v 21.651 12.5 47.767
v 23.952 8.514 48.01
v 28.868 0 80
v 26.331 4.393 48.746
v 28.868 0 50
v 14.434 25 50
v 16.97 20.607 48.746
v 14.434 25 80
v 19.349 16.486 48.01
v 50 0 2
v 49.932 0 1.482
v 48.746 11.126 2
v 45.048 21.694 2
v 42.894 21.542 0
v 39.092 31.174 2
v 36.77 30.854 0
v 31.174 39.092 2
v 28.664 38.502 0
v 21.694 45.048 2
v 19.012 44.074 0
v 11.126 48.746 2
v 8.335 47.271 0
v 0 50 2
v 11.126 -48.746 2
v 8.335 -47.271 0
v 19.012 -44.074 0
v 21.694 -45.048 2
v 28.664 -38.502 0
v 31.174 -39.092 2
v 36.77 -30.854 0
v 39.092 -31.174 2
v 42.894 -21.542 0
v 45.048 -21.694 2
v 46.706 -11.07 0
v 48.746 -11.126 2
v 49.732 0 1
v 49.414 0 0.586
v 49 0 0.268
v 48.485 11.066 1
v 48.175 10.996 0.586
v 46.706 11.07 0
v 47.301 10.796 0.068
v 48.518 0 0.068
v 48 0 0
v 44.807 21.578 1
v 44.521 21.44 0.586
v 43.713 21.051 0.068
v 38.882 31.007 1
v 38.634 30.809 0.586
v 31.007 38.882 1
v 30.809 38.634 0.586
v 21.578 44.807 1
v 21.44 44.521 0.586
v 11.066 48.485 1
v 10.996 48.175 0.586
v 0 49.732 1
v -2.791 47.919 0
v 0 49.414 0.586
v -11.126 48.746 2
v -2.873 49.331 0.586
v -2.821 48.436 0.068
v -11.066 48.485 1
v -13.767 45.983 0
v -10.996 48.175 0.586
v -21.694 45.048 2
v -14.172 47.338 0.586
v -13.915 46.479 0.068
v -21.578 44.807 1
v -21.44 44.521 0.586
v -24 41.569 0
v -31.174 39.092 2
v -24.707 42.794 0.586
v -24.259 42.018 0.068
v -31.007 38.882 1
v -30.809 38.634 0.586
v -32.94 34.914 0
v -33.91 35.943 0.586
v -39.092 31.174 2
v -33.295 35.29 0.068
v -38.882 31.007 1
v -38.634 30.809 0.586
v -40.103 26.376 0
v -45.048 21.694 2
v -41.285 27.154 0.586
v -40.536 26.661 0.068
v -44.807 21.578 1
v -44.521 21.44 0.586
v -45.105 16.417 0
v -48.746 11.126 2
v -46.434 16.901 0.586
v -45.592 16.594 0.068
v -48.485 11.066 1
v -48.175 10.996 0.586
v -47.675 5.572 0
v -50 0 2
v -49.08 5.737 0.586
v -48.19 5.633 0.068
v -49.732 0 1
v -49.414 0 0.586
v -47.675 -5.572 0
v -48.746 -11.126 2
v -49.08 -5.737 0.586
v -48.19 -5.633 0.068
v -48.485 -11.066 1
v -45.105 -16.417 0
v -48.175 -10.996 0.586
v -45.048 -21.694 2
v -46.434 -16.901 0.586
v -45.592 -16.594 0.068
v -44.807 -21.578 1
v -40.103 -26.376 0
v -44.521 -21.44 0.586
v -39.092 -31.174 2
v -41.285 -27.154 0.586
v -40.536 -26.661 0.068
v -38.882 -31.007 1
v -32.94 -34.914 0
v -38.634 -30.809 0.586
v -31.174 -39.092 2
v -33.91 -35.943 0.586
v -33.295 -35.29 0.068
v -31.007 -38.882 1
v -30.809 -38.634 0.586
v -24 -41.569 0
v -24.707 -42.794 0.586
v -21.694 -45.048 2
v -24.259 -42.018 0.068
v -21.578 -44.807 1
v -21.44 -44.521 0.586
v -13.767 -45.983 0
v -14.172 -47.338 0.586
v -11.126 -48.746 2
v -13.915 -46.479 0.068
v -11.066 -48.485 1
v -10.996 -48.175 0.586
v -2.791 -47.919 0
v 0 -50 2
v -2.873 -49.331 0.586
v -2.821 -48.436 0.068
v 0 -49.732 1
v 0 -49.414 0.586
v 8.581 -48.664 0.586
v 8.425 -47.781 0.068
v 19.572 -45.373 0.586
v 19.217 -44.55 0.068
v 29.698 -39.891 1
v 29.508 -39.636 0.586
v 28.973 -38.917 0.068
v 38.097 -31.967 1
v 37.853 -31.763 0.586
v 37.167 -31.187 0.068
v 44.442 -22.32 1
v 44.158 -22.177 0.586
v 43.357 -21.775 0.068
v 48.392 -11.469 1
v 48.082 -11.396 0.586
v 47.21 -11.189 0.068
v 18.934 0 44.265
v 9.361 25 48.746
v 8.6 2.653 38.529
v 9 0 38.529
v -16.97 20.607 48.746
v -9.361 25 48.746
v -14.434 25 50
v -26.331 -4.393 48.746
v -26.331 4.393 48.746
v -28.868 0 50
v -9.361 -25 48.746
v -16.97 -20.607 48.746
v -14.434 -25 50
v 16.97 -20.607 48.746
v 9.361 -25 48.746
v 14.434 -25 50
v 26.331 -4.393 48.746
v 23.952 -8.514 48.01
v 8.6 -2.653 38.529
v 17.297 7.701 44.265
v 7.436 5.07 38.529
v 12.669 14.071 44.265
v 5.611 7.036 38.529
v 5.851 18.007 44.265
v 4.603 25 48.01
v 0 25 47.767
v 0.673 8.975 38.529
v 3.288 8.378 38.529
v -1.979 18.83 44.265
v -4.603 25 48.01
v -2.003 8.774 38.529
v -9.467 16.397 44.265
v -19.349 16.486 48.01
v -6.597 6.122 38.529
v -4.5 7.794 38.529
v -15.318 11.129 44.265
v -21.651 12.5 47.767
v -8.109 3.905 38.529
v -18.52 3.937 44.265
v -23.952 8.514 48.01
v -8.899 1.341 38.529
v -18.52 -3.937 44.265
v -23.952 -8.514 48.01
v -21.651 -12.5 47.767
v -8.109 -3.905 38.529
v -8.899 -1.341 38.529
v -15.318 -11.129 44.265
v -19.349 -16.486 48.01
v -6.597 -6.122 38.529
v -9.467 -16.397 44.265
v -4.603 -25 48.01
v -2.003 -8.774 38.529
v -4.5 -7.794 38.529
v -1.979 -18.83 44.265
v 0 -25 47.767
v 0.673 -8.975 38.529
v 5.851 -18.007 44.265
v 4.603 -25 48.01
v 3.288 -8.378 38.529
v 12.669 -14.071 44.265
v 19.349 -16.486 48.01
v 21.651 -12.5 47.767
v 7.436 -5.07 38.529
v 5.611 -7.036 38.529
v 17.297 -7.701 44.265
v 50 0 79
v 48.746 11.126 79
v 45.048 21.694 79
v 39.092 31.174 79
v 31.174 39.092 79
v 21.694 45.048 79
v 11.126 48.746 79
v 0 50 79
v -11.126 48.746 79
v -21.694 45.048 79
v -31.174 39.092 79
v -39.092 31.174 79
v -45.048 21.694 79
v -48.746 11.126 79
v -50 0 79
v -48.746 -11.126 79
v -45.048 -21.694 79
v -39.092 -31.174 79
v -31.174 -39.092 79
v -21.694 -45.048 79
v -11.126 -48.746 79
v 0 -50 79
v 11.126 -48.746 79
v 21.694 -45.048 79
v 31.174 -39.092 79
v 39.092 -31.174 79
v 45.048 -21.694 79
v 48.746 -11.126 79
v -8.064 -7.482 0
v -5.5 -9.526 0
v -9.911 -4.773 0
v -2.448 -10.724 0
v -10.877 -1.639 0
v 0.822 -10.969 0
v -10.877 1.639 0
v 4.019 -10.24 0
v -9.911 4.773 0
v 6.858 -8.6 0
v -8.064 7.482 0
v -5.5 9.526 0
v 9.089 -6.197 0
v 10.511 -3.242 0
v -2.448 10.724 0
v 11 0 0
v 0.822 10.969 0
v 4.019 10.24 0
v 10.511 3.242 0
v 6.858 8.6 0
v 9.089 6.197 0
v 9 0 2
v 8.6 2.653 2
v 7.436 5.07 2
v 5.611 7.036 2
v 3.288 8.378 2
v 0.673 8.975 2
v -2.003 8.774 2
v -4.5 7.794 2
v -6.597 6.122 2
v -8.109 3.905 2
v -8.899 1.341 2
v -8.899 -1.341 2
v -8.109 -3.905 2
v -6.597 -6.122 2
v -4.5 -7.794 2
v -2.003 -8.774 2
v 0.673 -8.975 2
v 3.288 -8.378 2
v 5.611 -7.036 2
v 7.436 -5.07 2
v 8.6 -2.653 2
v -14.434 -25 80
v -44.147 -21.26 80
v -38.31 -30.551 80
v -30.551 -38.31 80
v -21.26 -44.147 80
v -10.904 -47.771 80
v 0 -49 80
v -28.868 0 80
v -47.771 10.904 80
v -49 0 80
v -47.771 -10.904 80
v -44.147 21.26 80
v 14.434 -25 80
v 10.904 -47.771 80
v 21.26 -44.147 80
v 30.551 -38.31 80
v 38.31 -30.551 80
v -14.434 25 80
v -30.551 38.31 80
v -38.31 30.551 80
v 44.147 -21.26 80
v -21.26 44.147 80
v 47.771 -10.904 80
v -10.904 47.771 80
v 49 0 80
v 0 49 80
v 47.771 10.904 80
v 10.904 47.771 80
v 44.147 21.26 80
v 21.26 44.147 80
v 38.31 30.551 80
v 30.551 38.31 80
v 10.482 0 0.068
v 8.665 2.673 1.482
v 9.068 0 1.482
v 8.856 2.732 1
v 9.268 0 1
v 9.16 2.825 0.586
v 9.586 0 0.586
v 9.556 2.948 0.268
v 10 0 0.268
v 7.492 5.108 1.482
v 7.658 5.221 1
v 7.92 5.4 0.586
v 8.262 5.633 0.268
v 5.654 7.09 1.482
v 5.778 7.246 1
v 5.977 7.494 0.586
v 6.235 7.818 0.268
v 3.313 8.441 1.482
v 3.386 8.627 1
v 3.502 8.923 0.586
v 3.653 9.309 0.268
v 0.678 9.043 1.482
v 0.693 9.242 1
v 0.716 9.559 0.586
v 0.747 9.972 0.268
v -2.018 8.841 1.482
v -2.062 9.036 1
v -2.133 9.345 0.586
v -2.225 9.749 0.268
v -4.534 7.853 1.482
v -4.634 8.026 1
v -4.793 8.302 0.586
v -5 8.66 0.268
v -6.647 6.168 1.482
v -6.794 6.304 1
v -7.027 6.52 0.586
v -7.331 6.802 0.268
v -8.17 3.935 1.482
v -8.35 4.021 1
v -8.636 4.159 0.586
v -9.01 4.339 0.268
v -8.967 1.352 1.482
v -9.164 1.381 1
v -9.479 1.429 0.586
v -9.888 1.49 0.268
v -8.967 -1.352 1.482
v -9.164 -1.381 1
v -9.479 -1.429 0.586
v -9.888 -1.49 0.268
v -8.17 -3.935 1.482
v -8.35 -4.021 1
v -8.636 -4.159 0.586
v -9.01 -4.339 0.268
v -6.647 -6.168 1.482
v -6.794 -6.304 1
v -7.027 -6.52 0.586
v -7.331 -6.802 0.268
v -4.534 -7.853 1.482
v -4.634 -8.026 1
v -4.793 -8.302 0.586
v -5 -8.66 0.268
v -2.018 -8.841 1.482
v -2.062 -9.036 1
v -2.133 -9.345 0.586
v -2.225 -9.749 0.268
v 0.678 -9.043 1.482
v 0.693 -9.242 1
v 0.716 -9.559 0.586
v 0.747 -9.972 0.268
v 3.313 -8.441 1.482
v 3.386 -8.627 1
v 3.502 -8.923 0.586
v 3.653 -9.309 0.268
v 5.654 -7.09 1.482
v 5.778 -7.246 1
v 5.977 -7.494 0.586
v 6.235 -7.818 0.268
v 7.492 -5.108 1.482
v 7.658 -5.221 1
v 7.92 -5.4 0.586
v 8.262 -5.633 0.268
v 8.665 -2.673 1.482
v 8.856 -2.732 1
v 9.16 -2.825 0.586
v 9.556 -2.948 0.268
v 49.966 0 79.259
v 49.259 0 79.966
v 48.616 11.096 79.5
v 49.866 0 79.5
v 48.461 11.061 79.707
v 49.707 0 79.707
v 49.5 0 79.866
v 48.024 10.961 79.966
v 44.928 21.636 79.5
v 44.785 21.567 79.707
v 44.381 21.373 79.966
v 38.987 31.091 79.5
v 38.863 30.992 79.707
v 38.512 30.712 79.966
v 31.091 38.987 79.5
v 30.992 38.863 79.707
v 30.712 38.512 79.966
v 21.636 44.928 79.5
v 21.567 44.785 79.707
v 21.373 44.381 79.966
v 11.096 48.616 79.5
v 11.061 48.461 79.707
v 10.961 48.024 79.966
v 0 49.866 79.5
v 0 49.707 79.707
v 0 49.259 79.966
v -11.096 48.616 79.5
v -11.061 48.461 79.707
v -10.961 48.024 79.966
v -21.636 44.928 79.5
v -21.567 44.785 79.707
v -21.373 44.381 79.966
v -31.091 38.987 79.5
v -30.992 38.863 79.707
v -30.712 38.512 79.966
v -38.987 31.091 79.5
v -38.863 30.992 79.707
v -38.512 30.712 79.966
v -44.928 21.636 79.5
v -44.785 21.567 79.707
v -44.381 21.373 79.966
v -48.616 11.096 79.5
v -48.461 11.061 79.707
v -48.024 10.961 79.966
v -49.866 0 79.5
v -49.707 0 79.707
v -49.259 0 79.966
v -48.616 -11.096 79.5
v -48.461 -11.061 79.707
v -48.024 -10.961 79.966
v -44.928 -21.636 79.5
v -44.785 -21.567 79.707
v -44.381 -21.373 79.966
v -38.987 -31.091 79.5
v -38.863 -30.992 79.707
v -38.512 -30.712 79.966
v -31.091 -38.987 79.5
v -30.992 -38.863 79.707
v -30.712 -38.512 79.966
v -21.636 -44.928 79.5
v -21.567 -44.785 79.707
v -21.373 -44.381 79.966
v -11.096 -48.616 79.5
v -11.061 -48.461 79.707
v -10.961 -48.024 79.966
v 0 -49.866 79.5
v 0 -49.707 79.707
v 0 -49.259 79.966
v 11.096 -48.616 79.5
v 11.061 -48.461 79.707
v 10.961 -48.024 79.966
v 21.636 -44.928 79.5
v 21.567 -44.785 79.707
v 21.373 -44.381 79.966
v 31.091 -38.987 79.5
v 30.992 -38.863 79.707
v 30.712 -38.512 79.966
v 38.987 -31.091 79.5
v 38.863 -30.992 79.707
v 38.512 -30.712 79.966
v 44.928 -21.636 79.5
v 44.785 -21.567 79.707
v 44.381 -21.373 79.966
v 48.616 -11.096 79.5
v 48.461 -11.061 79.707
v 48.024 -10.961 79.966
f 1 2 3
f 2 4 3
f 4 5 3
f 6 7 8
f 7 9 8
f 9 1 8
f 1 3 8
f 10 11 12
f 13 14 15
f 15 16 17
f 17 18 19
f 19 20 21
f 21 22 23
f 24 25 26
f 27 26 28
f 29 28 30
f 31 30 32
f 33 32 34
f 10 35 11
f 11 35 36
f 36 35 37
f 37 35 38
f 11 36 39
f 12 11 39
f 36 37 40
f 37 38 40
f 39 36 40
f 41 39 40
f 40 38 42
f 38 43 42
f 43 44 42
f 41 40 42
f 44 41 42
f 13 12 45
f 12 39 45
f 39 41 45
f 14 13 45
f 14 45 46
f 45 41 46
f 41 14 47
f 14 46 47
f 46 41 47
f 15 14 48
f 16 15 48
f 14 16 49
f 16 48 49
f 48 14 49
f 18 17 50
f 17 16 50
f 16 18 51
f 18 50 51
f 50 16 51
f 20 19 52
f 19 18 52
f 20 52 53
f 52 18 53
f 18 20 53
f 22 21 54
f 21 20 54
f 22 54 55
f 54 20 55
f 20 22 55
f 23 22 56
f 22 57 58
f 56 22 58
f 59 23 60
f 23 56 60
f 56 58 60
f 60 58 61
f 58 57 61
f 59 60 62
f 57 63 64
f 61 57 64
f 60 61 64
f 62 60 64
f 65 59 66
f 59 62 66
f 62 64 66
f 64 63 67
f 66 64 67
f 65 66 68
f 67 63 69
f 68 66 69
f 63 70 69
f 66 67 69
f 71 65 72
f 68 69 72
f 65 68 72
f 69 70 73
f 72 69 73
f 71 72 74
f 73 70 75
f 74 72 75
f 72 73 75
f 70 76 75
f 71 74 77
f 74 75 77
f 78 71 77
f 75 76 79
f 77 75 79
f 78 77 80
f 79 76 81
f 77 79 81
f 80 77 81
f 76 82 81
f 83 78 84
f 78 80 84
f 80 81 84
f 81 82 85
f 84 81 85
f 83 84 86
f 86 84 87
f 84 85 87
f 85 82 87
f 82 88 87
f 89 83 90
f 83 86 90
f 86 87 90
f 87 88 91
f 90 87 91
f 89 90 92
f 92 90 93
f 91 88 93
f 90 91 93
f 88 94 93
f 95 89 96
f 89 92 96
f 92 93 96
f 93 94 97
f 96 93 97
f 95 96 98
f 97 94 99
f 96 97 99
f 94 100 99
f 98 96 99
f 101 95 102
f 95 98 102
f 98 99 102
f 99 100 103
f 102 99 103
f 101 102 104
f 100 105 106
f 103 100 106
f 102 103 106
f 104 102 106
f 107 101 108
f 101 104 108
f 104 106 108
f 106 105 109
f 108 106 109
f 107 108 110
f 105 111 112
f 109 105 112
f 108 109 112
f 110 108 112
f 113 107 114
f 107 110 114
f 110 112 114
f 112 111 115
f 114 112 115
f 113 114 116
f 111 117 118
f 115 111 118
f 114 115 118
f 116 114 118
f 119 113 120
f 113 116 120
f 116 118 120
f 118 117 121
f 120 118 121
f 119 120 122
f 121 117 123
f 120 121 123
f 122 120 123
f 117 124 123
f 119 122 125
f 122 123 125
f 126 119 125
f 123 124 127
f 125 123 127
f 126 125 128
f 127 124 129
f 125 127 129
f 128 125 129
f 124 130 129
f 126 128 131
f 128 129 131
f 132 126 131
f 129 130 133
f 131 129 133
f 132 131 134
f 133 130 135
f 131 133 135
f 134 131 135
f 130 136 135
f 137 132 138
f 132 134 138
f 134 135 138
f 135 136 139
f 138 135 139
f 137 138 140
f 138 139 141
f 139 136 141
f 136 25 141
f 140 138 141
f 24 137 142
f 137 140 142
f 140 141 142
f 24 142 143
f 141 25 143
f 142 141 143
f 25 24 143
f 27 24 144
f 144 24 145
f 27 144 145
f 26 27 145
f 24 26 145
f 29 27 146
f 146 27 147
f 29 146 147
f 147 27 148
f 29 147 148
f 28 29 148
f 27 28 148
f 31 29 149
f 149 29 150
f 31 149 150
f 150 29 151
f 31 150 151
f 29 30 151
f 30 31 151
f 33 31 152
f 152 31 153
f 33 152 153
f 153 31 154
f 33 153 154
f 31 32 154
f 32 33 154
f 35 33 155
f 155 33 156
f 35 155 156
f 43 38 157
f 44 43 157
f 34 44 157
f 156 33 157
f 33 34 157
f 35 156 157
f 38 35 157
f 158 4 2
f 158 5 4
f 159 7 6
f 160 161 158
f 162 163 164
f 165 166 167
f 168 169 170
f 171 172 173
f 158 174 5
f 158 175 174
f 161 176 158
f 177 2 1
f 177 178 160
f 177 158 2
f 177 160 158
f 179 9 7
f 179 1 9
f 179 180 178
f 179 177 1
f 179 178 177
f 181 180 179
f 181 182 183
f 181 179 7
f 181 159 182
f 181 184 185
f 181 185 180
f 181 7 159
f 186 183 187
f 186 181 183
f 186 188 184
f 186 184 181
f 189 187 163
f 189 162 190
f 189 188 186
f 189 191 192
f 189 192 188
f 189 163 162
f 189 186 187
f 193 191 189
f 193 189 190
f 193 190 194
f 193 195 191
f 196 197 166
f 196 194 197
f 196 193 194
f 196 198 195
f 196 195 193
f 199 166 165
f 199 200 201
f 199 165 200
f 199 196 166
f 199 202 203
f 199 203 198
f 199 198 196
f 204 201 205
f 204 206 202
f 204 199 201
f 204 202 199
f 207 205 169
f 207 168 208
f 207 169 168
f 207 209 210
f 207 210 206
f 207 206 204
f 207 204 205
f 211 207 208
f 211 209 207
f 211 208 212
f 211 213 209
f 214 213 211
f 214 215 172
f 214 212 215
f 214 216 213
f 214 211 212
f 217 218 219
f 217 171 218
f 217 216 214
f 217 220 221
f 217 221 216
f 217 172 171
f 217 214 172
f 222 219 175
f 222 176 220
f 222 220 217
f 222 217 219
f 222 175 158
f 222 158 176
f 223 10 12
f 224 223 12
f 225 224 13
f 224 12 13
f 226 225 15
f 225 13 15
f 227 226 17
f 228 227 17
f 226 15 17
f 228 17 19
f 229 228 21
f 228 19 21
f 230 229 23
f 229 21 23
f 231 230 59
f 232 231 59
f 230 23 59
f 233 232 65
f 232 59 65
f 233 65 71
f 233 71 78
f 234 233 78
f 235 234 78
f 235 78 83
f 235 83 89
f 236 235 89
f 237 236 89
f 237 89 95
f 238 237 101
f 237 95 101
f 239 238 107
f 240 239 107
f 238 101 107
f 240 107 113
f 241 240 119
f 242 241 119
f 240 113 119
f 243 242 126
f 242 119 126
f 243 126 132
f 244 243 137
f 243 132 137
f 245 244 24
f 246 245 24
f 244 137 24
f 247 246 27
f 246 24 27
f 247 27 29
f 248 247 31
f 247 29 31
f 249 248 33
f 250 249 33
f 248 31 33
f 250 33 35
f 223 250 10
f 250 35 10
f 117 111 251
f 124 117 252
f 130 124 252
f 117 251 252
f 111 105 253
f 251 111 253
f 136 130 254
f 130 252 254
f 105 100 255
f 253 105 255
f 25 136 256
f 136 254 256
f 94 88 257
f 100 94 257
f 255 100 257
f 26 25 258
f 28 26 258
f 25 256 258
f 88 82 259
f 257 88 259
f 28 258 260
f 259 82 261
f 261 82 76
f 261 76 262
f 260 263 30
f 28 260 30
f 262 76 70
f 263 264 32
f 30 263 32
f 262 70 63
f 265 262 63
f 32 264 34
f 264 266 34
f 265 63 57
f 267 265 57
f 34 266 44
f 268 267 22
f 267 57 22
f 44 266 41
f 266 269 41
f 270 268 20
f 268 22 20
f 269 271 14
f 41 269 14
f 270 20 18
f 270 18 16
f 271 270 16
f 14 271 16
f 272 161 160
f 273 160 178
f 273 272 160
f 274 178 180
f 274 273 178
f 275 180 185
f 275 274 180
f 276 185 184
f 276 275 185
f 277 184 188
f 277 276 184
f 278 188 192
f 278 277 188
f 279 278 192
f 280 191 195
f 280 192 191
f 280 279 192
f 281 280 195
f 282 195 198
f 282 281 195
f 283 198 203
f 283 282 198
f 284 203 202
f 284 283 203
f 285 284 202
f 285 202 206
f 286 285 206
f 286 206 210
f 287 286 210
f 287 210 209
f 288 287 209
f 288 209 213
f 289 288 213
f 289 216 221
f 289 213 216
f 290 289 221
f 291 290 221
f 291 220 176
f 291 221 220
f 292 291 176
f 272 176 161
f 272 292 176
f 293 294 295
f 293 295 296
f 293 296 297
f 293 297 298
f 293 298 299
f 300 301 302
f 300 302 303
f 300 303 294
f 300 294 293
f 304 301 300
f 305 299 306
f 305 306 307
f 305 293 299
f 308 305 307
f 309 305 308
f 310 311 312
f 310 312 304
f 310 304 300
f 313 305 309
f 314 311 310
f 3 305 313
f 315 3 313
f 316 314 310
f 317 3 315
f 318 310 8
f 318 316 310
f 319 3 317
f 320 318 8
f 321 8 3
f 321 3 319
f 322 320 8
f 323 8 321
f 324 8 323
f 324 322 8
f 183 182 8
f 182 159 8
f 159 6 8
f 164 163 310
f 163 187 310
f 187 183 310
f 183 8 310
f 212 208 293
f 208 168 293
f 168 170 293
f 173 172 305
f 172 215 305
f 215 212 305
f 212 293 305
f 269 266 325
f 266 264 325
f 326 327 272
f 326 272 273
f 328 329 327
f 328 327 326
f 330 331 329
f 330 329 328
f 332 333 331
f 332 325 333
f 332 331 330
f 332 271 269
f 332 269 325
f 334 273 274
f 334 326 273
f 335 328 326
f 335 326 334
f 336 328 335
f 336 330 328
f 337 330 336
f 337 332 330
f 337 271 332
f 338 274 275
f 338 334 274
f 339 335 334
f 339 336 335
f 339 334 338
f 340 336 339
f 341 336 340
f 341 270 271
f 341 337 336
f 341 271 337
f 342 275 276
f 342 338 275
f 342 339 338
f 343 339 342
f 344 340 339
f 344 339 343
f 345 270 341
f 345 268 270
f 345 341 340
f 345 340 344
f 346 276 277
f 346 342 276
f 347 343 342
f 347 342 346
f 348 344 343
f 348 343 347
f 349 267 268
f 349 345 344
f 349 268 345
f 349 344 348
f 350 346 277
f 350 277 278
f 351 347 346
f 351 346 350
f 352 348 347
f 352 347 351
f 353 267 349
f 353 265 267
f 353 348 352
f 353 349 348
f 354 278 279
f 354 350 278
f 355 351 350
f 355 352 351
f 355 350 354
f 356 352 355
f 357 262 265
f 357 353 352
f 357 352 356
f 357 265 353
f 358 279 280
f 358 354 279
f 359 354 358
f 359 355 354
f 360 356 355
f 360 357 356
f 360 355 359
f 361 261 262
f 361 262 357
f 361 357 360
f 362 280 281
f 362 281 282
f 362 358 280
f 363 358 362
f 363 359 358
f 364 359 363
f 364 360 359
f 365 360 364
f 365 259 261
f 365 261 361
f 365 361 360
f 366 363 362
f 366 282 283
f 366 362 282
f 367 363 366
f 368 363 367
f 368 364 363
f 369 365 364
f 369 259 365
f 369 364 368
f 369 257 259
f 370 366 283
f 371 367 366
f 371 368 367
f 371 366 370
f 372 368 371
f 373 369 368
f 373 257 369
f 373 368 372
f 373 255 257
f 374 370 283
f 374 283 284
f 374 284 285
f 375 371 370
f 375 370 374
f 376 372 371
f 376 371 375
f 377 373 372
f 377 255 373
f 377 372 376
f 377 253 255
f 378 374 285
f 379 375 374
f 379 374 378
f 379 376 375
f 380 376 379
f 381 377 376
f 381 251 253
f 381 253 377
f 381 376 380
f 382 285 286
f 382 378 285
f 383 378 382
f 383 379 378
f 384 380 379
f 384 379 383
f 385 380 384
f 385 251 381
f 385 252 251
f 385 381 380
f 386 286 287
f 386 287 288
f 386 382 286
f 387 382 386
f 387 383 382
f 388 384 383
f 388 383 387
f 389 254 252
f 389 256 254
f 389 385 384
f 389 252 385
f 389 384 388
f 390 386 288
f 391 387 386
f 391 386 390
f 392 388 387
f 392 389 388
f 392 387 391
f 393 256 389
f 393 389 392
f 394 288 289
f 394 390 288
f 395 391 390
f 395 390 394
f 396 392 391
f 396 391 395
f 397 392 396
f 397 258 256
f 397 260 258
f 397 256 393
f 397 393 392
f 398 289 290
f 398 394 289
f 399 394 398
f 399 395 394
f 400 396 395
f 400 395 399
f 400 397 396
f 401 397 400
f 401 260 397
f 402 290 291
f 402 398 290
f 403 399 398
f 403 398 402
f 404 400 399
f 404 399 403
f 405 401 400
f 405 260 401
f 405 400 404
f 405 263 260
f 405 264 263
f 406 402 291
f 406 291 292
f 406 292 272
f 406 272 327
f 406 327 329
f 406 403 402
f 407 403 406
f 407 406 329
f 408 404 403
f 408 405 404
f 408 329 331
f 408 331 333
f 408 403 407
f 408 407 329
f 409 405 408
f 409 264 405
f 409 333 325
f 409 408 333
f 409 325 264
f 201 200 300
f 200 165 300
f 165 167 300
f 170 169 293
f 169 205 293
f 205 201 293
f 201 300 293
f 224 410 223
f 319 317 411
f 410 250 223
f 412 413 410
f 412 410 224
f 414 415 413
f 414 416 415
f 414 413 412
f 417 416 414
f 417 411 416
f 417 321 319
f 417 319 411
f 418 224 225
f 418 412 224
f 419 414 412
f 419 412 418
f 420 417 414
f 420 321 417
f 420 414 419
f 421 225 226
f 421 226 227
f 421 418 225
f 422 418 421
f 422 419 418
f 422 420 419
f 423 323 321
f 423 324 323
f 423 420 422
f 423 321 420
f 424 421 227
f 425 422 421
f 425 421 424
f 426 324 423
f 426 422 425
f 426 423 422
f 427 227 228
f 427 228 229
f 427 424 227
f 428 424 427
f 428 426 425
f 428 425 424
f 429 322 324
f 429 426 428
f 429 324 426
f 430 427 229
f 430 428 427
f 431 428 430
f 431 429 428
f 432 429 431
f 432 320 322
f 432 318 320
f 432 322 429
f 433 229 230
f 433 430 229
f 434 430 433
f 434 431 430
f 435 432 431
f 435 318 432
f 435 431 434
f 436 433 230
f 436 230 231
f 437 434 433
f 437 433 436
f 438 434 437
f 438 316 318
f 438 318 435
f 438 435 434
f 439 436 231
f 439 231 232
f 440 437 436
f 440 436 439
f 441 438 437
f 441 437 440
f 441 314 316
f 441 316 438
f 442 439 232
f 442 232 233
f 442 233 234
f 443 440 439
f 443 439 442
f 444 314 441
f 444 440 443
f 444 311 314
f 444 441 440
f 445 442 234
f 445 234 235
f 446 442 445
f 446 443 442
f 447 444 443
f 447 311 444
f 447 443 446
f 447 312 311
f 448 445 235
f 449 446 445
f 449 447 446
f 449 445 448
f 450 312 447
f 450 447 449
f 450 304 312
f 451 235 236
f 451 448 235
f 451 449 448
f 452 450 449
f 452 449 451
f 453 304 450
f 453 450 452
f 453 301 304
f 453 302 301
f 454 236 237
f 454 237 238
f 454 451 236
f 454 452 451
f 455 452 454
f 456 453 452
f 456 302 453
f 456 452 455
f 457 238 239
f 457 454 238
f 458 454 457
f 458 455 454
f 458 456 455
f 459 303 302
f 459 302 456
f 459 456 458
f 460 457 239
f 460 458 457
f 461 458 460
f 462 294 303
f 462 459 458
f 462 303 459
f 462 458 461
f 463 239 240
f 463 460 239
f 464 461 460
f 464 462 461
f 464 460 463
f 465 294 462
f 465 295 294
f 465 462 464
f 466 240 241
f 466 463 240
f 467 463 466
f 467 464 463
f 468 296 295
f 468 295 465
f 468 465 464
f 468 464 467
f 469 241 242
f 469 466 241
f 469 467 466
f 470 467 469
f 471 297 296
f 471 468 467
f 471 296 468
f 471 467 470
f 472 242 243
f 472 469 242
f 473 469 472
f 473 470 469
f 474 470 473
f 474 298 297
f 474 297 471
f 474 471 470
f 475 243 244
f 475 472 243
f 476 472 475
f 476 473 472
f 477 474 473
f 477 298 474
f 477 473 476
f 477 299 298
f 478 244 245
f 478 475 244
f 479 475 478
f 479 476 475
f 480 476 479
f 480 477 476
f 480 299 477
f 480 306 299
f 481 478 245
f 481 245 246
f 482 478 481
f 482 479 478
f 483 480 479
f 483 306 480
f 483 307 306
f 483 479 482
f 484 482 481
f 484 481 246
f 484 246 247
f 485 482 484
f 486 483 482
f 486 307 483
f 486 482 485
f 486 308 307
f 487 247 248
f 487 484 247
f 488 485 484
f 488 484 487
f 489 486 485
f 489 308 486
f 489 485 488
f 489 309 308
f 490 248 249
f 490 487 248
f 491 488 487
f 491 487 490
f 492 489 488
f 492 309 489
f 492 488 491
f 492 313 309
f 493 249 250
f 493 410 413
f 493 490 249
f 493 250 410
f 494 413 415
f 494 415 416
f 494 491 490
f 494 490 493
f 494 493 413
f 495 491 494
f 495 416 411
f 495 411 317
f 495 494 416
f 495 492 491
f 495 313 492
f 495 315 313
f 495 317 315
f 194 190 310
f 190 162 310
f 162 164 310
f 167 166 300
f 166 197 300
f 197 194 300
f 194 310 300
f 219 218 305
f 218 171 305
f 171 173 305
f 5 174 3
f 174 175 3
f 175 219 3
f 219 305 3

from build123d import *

# Parameters (mm, degrees)
SKIZZE1_R                       = 50
SKIZZE1_R_2                     = 9
AUFSATZ_LINEAR_AUSTRAGEN1_DEPTH = 80
VERRUNDUNG1_R                   = 2
VERRUNDUNG2_R                   = 1
AUFSATZ_LINEAR_AUSTRAGEN2_DEPTH = 30
SKIZZE12_OUTSIDE_W              = 134.496
SKIZZE12_OUTSIDE_H              = 134.496
SCHNITT_LINEAR_AUSTRAGEN3_DEPTH = 81


with BuildPart() as part:
    # Skizze1 → Aufsatz-Linear austragen1 (new body)
    with BuildSketch(Plane.XY):
        Circle(SKIZZE1_R)
        Circle(SKIZZE1_R_2, mode=Mode.SUBTRACT)
    extrude(amount=AUFSATZ_LINEAR_AUSTRAGEN1_DEPTH)

    # Verrundung1
    verrundung1_edges = [part.edges().sort_by_distance(p)[0] for p in [
        (-50, 0, 0),
        (-9, 0, 0),
    ]]
    fillet(verrundung1_edges, radius=VERRUNDUNG1_R)

    # Verrundung2
    verrundung2_edges = [part.edges().sort_by_distance(p)[0] for p in [
        (-50, 0, 80),
    ]]
    fillet(verrundung2_edges, radius=VERRUNDUNG2_R)


with BuildPart() as body_2:
    # Skizze2 → Aufsatz-Linear austragen2 (new body)
    with BuildSketch(Plane.XY.offset(80)):
        Polygon((28.867513459, 0), (14.43375673, 25), (-14.43375673, 25), (-28.867513459, 0), (-14.43375673, -25), (14.43375673, -25), align=None)
    extrude(amount=-AUFSATZ_LINEAR_AUSTRAGEN2_DEPTH)

    # Skizze10 → Rotation1 (revolve)
    with BuildSketch(Plane(origin=(-14.43375673, 0, 0), x_dir=(0, 0, 1), z_dir=(0, -1, 0)), mode=Mode.PRIVATE) as rotation1_sk:
        Polygon((50, 14.43375673), (33.333333333, -14.43375673), (50, -14.43375673), align=None)
    revolve(rotation1_sk.sketch.rotate(Axis((0, 0, 33.333333333), (0, 0, 1)), 180), axis=Axis((0, 0, 33.333333333), (0, 0, 1)))  # turned: the seam where the file's is

    # Skizze12 outside → Schnitt-Linear austragen3 (cut, through all)
    with BuildSketch(Plane.XY.offset(80)):
        Rectangle(SKIZZE12_OUTSIDE_W, SKIZZE12_OUTSIDE_H)
        Polygon((14.43375673, -25), (28.867513459, 0), (14.43375673, 25), (-14.43375673, 25), (-28.867513459, 0), (-14.43375673, -25), align=None, mode=Mode.SUBTRACT)
    extrude(amount=-SCHNITT_LINEAR_AUSTRAGEN3_DEPTH, mode=Mode.SUBTRACT)


with BuildPart() as part_1:
    add(part.part)

    # Kombinieren1: cut body 2
    add(body_2.part, mode=Mode.SUBTRACT)


solid = part_1.part
